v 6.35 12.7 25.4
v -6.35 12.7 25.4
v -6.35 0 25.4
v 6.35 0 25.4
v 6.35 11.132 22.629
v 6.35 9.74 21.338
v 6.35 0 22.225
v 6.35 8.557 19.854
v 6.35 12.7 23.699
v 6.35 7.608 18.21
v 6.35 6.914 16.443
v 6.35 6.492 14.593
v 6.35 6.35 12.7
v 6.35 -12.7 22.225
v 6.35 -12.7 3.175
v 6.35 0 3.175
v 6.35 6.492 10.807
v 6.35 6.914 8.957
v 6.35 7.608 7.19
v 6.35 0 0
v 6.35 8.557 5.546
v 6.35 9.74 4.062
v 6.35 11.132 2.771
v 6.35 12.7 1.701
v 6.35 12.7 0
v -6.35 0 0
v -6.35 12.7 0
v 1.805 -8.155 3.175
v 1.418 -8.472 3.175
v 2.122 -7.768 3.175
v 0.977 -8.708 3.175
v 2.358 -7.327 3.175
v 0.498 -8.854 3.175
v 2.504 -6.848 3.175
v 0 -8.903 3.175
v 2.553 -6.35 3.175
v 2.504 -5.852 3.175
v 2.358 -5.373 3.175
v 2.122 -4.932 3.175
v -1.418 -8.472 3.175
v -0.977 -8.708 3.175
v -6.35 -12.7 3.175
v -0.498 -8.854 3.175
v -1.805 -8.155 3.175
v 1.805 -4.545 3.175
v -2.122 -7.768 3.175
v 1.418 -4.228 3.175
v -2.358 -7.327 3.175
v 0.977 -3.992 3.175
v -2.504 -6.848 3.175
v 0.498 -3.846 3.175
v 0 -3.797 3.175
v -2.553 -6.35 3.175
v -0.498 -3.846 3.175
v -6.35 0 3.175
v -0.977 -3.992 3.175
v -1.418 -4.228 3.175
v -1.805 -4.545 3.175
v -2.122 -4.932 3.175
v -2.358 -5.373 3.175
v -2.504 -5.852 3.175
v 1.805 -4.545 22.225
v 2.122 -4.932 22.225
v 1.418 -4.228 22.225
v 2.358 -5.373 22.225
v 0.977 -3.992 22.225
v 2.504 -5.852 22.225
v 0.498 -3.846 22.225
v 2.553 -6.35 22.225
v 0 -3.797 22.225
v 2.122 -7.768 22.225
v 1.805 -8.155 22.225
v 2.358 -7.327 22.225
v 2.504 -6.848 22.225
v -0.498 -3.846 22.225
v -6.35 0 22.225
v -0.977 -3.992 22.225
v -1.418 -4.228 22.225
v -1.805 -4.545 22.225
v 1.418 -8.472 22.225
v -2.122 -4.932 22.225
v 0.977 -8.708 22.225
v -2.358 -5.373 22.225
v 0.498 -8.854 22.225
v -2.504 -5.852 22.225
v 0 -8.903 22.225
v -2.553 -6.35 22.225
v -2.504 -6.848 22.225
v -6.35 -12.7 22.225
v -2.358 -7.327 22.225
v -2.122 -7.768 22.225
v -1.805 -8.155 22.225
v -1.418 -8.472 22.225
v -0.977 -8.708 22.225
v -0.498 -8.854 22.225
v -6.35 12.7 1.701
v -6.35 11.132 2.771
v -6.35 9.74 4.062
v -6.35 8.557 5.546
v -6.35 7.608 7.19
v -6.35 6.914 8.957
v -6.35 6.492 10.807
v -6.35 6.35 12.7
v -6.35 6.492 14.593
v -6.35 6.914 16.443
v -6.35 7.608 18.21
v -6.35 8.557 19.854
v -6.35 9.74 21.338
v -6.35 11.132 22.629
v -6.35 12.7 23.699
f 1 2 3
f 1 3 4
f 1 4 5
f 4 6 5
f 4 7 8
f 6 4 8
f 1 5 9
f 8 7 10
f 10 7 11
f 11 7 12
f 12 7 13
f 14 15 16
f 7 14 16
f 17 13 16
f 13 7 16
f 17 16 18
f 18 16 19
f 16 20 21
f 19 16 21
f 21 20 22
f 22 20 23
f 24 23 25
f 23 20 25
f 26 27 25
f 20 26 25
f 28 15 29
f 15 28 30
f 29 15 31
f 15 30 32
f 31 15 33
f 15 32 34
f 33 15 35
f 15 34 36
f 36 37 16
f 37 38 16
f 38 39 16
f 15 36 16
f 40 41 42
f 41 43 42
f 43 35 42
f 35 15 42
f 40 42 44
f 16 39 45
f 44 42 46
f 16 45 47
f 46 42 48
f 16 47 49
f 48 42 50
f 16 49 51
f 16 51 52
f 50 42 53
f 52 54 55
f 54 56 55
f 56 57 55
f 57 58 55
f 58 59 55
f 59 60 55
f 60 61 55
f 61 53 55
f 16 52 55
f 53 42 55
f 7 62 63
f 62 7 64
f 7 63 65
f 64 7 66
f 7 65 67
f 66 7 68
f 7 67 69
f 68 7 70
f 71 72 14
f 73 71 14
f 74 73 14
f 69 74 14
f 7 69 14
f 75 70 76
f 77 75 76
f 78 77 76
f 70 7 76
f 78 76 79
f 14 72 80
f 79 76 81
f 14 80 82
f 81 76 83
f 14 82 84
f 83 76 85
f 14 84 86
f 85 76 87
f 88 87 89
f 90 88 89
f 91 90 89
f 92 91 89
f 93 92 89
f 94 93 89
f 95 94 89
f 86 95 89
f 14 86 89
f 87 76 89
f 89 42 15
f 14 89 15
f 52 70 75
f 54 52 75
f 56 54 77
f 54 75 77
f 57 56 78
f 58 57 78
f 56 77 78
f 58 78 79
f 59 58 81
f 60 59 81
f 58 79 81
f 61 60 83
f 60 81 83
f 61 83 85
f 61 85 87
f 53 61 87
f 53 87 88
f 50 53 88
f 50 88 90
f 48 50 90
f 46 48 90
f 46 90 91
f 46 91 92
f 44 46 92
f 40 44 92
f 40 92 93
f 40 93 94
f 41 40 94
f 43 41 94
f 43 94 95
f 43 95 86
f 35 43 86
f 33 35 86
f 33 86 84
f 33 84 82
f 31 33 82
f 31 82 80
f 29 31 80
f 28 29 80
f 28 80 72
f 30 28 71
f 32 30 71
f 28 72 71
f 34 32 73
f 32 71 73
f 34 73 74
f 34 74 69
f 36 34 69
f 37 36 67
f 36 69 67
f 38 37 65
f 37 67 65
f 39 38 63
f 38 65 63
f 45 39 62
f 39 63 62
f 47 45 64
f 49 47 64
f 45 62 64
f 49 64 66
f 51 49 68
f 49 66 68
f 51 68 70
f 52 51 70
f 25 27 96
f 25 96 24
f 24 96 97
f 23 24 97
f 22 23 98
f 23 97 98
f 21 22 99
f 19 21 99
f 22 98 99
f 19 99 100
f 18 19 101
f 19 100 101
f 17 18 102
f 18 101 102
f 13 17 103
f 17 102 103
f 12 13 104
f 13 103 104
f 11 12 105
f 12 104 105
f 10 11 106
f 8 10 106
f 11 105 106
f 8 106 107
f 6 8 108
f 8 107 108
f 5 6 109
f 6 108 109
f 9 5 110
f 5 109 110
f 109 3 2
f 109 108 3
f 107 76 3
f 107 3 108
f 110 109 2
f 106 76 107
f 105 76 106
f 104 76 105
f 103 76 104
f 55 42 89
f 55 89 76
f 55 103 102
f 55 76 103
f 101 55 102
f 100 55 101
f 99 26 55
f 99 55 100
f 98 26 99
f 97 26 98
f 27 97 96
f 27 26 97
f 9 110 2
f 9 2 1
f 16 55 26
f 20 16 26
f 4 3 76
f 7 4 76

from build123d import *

# Parameters (mm, degrees)
SKETCH1_W               = 12.7
SKETCH1_H               = 25.4
BOSS_EXTRUDE1_DEPTH     = 25.4
SKETCH2_OUTSIDE_W       = 35.02
SKETCH2_OUTSIDE_H       = 35.02
CUT_EXTRUDE1_DEPTH      = 13.7
F_1_4_20_TAPPED_HOLE2_D = 5.1054


with BuildPart() as part:
    # Sketch1 → Boss-Extrude1 (new body)
    with BuildSketch(Plane.XY):
        Rectangle(SKETCH1_W, SKETCH1_H)
    extrude(amount=BOSS_EXTRUDE1_DEPTH)

    # Sketch2 outside → Cut-Extrude1 (cut, through all)
    with BuildSketch(Plane.ZY.offset(6.35)):
        with Locations((12.7, 0)):
            Rectangle(SKETCH2_OUTSIDE_W, SKETCH2_OUTSIDE_H)
        with BuildLine():
            Line((23.698522628, 12.7), (25.4, 12.7))
            Line((25.4, 12.7), (25.4, 0))
            Line((25.4, 0), (22.225, 0))
            Line((22.225, 0), (22.225, -12.7))
            Line((22.225, -12.7), (3.175, -12.7))
            Line((3.175, -12.7), (3.175, 0))
            Line((3.175, 0), (0, 0))
            Line((0, 0), (0, 12.7))
            Line((0, 12.7), (1.701477372, 12.7))
            ThreePointArc((1.701477372, 12.7), (12.7, 6.35), (23.698522628, 12.7))
        make_face(mode=Mode.SUBTRACT)
    extrude(amount=-CUT_EXTRUDE1_DEPTH, mode=Mode.SUBTRACT)

    # 1/4-20 Tapped Hole2 (through all)
    with Locations(Plane(origin=(0, -6.35, 3.175), x_dir=(0, -1, 0), z_dir=(0, 0, -1))):
        with Locations((0, 0)):
            Hole(F_1_4_20_TAPPED_HOLE2_D / 2)


solid = part.part
